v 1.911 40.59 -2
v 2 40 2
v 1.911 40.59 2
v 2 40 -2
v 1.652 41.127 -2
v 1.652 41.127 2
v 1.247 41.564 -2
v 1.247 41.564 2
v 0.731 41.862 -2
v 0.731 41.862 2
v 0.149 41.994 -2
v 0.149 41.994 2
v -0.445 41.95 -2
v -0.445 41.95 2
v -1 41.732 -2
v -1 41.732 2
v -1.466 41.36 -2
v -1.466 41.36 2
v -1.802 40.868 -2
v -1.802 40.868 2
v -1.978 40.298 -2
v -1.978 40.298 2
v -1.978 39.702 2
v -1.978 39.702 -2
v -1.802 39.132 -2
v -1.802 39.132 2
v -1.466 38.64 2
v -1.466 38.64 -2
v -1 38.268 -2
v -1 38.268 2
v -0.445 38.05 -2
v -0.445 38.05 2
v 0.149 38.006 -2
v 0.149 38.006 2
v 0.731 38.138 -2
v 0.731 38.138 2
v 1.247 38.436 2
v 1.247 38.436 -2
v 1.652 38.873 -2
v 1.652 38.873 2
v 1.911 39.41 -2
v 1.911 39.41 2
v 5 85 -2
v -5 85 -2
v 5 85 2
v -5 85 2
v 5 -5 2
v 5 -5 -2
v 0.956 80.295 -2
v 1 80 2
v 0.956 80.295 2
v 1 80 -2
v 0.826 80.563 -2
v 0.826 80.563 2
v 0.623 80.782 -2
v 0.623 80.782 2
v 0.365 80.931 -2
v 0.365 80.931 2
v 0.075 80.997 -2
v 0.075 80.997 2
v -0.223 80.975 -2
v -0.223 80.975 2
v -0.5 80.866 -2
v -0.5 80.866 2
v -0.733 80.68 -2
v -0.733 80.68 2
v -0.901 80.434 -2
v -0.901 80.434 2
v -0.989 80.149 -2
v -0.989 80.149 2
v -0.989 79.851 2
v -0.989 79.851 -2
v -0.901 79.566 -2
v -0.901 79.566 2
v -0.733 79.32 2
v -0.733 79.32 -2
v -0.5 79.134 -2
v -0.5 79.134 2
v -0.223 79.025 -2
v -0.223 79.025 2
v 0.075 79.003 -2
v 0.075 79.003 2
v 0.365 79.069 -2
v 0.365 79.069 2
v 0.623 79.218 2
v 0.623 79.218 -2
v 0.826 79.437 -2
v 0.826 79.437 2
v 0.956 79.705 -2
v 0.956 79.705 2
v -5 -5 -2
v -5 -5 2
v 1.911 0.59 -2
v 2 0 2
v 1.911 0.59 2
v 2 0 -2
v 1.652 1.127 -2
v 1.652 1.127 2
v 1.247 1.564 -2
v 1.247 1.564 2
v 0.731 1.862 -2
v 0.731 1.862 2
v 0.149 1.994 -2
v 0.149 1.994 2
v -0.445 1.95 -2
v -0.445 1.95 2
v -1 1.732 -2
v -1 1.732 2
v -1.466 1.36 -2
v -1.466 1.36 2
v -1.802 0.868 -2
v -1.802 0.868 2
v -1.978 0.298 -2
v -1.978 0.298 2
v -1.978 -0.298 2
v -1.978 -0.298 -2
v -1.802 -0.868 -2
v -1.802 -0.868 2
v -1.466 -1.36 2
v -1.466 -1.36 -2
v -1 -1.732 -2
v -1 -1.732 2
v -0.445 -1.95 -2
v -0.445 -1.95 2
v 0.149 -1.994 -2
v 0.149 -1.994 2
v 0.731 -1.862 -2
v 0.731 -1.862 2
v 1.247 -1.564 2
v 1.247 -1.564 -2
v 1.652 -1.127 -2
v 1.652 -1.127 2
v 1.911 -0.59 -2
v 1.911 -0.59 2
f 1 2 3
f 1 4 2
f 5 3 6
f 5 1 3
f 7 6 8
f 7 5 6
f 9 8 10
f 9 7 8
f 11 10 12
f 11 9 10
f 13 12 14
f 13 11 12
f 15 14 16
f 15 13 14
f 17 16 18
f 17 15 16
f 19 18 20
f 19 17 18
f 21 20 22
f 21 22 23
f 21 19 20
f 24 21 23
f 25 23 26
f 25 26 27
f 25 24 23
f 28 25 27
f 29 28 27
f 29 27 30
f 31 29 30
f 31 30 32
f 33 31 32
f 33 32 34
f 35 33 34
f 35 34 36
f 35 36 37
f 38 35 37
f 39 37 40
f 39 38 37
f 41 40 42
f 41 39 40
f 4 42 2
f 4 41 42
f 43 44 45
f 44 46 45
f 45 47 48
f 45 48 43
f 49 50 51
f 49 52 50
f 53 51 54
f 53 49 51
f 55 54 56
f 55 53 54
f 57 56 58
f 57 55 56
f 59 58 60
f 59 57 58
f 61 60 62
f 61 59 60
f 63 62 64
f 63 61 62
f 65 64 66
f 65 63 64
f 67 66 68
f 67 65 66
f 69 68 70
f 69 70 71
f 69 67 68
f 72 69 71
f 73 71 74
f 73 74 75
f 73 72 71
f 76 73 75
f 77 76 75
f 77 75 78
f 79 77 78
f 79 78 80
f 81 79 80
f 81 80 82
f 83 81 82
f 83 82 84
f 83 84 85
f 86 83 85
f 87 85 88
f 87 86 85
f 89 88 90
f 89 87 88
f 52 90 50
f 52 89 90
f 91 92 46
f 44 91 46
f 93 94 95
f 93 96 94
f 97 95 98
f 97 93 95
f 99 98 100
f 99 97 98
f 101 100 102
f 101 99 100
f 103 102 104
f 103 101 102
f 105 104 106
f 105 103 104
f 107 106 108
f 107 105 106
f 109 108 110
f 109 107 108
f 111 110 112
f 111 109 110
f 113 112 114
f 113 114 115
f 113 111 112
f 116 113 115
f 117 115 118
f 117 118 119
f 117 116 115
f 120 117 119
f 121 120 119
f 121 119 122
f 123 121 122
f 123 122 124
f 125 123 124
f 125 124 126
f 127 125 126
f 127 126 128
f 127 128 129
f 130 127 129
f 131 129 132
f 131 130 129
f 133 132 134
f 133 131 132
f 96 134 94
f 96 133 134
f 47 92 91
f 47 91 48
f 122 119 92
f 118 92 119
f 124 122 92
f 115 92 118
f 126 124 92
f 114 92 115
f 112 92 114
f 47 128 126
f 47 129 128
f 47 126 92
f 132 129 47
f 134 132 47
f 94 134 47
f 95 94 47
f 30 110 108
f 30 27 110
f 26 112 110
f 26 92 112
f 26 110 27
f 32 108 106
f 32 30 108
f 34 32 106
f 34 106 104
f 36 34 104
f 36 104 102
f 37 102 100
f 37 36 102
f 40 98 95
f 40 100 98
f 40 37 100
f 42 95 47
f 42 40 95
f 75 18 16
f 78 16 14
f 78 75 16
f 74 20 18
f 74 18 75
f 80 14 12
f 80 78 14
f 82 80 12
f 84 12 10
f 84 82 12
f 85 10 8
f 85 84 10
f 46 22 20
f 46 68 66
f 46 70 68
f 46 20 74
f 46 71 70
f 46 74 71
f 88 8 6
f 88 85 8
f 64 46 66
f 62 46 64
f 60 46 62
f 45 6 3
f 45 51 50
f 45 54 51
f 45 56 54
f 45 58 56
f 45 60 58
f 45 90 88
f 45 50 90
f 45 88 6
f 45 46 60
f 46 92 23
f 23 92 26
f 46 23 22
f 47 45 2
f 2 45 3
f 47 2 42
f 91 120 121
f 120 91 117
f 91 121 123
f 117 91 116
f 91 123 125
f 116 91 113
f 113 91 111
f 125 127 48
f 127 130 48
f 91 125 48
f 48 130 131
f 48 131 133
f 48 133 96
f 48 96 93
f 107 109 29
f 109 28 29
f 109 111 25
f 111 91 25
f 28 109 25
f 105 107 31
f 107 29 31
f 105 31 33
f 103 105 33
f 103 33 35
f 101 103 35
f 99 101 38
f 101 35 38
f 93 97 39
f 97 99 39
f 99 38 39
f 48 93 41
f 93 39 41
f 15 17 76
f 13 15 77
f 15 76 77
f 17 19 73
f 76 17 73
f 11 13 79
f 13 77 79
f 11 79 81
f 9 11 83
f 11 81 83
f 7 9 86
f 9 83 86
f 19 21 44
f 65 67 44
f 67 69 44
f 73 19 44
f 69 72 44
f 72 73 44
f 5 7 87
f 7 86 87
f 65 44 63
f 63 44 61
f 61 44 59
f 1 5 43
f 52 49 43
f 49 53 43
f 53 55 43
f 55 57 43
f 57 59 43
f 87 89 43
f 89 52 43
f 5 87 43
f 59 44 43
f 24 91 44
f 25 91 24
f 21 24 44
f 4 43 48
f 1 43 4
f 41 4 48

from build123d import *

# Parameters (mm, degrees)
F0_W     = 10
F0_H     = 90
F0_R     = 2
F0_R_2   = 1
F1_DEPTH = 2


with BuildPart() as f1:
    # F0 (on Top) → F1 (new body, symmetric)
    with BuildSketch(Plane.XY):
        with Locations((0, 40)):
            Rectangle(F0_W, F0_H)
        Circle(F0_R, mode=Mode.SUBTRACT)
        with Locations((0, 40)):
            Circle(F0_R, mode=Mode.SUBTRACT)
        with Locations((0, 80)):
            Circle(F0_R_2, mode=Mode.SUBTRACT)
    extrude(amount=F1_DEPTH, both=True)


solid = f1.part
